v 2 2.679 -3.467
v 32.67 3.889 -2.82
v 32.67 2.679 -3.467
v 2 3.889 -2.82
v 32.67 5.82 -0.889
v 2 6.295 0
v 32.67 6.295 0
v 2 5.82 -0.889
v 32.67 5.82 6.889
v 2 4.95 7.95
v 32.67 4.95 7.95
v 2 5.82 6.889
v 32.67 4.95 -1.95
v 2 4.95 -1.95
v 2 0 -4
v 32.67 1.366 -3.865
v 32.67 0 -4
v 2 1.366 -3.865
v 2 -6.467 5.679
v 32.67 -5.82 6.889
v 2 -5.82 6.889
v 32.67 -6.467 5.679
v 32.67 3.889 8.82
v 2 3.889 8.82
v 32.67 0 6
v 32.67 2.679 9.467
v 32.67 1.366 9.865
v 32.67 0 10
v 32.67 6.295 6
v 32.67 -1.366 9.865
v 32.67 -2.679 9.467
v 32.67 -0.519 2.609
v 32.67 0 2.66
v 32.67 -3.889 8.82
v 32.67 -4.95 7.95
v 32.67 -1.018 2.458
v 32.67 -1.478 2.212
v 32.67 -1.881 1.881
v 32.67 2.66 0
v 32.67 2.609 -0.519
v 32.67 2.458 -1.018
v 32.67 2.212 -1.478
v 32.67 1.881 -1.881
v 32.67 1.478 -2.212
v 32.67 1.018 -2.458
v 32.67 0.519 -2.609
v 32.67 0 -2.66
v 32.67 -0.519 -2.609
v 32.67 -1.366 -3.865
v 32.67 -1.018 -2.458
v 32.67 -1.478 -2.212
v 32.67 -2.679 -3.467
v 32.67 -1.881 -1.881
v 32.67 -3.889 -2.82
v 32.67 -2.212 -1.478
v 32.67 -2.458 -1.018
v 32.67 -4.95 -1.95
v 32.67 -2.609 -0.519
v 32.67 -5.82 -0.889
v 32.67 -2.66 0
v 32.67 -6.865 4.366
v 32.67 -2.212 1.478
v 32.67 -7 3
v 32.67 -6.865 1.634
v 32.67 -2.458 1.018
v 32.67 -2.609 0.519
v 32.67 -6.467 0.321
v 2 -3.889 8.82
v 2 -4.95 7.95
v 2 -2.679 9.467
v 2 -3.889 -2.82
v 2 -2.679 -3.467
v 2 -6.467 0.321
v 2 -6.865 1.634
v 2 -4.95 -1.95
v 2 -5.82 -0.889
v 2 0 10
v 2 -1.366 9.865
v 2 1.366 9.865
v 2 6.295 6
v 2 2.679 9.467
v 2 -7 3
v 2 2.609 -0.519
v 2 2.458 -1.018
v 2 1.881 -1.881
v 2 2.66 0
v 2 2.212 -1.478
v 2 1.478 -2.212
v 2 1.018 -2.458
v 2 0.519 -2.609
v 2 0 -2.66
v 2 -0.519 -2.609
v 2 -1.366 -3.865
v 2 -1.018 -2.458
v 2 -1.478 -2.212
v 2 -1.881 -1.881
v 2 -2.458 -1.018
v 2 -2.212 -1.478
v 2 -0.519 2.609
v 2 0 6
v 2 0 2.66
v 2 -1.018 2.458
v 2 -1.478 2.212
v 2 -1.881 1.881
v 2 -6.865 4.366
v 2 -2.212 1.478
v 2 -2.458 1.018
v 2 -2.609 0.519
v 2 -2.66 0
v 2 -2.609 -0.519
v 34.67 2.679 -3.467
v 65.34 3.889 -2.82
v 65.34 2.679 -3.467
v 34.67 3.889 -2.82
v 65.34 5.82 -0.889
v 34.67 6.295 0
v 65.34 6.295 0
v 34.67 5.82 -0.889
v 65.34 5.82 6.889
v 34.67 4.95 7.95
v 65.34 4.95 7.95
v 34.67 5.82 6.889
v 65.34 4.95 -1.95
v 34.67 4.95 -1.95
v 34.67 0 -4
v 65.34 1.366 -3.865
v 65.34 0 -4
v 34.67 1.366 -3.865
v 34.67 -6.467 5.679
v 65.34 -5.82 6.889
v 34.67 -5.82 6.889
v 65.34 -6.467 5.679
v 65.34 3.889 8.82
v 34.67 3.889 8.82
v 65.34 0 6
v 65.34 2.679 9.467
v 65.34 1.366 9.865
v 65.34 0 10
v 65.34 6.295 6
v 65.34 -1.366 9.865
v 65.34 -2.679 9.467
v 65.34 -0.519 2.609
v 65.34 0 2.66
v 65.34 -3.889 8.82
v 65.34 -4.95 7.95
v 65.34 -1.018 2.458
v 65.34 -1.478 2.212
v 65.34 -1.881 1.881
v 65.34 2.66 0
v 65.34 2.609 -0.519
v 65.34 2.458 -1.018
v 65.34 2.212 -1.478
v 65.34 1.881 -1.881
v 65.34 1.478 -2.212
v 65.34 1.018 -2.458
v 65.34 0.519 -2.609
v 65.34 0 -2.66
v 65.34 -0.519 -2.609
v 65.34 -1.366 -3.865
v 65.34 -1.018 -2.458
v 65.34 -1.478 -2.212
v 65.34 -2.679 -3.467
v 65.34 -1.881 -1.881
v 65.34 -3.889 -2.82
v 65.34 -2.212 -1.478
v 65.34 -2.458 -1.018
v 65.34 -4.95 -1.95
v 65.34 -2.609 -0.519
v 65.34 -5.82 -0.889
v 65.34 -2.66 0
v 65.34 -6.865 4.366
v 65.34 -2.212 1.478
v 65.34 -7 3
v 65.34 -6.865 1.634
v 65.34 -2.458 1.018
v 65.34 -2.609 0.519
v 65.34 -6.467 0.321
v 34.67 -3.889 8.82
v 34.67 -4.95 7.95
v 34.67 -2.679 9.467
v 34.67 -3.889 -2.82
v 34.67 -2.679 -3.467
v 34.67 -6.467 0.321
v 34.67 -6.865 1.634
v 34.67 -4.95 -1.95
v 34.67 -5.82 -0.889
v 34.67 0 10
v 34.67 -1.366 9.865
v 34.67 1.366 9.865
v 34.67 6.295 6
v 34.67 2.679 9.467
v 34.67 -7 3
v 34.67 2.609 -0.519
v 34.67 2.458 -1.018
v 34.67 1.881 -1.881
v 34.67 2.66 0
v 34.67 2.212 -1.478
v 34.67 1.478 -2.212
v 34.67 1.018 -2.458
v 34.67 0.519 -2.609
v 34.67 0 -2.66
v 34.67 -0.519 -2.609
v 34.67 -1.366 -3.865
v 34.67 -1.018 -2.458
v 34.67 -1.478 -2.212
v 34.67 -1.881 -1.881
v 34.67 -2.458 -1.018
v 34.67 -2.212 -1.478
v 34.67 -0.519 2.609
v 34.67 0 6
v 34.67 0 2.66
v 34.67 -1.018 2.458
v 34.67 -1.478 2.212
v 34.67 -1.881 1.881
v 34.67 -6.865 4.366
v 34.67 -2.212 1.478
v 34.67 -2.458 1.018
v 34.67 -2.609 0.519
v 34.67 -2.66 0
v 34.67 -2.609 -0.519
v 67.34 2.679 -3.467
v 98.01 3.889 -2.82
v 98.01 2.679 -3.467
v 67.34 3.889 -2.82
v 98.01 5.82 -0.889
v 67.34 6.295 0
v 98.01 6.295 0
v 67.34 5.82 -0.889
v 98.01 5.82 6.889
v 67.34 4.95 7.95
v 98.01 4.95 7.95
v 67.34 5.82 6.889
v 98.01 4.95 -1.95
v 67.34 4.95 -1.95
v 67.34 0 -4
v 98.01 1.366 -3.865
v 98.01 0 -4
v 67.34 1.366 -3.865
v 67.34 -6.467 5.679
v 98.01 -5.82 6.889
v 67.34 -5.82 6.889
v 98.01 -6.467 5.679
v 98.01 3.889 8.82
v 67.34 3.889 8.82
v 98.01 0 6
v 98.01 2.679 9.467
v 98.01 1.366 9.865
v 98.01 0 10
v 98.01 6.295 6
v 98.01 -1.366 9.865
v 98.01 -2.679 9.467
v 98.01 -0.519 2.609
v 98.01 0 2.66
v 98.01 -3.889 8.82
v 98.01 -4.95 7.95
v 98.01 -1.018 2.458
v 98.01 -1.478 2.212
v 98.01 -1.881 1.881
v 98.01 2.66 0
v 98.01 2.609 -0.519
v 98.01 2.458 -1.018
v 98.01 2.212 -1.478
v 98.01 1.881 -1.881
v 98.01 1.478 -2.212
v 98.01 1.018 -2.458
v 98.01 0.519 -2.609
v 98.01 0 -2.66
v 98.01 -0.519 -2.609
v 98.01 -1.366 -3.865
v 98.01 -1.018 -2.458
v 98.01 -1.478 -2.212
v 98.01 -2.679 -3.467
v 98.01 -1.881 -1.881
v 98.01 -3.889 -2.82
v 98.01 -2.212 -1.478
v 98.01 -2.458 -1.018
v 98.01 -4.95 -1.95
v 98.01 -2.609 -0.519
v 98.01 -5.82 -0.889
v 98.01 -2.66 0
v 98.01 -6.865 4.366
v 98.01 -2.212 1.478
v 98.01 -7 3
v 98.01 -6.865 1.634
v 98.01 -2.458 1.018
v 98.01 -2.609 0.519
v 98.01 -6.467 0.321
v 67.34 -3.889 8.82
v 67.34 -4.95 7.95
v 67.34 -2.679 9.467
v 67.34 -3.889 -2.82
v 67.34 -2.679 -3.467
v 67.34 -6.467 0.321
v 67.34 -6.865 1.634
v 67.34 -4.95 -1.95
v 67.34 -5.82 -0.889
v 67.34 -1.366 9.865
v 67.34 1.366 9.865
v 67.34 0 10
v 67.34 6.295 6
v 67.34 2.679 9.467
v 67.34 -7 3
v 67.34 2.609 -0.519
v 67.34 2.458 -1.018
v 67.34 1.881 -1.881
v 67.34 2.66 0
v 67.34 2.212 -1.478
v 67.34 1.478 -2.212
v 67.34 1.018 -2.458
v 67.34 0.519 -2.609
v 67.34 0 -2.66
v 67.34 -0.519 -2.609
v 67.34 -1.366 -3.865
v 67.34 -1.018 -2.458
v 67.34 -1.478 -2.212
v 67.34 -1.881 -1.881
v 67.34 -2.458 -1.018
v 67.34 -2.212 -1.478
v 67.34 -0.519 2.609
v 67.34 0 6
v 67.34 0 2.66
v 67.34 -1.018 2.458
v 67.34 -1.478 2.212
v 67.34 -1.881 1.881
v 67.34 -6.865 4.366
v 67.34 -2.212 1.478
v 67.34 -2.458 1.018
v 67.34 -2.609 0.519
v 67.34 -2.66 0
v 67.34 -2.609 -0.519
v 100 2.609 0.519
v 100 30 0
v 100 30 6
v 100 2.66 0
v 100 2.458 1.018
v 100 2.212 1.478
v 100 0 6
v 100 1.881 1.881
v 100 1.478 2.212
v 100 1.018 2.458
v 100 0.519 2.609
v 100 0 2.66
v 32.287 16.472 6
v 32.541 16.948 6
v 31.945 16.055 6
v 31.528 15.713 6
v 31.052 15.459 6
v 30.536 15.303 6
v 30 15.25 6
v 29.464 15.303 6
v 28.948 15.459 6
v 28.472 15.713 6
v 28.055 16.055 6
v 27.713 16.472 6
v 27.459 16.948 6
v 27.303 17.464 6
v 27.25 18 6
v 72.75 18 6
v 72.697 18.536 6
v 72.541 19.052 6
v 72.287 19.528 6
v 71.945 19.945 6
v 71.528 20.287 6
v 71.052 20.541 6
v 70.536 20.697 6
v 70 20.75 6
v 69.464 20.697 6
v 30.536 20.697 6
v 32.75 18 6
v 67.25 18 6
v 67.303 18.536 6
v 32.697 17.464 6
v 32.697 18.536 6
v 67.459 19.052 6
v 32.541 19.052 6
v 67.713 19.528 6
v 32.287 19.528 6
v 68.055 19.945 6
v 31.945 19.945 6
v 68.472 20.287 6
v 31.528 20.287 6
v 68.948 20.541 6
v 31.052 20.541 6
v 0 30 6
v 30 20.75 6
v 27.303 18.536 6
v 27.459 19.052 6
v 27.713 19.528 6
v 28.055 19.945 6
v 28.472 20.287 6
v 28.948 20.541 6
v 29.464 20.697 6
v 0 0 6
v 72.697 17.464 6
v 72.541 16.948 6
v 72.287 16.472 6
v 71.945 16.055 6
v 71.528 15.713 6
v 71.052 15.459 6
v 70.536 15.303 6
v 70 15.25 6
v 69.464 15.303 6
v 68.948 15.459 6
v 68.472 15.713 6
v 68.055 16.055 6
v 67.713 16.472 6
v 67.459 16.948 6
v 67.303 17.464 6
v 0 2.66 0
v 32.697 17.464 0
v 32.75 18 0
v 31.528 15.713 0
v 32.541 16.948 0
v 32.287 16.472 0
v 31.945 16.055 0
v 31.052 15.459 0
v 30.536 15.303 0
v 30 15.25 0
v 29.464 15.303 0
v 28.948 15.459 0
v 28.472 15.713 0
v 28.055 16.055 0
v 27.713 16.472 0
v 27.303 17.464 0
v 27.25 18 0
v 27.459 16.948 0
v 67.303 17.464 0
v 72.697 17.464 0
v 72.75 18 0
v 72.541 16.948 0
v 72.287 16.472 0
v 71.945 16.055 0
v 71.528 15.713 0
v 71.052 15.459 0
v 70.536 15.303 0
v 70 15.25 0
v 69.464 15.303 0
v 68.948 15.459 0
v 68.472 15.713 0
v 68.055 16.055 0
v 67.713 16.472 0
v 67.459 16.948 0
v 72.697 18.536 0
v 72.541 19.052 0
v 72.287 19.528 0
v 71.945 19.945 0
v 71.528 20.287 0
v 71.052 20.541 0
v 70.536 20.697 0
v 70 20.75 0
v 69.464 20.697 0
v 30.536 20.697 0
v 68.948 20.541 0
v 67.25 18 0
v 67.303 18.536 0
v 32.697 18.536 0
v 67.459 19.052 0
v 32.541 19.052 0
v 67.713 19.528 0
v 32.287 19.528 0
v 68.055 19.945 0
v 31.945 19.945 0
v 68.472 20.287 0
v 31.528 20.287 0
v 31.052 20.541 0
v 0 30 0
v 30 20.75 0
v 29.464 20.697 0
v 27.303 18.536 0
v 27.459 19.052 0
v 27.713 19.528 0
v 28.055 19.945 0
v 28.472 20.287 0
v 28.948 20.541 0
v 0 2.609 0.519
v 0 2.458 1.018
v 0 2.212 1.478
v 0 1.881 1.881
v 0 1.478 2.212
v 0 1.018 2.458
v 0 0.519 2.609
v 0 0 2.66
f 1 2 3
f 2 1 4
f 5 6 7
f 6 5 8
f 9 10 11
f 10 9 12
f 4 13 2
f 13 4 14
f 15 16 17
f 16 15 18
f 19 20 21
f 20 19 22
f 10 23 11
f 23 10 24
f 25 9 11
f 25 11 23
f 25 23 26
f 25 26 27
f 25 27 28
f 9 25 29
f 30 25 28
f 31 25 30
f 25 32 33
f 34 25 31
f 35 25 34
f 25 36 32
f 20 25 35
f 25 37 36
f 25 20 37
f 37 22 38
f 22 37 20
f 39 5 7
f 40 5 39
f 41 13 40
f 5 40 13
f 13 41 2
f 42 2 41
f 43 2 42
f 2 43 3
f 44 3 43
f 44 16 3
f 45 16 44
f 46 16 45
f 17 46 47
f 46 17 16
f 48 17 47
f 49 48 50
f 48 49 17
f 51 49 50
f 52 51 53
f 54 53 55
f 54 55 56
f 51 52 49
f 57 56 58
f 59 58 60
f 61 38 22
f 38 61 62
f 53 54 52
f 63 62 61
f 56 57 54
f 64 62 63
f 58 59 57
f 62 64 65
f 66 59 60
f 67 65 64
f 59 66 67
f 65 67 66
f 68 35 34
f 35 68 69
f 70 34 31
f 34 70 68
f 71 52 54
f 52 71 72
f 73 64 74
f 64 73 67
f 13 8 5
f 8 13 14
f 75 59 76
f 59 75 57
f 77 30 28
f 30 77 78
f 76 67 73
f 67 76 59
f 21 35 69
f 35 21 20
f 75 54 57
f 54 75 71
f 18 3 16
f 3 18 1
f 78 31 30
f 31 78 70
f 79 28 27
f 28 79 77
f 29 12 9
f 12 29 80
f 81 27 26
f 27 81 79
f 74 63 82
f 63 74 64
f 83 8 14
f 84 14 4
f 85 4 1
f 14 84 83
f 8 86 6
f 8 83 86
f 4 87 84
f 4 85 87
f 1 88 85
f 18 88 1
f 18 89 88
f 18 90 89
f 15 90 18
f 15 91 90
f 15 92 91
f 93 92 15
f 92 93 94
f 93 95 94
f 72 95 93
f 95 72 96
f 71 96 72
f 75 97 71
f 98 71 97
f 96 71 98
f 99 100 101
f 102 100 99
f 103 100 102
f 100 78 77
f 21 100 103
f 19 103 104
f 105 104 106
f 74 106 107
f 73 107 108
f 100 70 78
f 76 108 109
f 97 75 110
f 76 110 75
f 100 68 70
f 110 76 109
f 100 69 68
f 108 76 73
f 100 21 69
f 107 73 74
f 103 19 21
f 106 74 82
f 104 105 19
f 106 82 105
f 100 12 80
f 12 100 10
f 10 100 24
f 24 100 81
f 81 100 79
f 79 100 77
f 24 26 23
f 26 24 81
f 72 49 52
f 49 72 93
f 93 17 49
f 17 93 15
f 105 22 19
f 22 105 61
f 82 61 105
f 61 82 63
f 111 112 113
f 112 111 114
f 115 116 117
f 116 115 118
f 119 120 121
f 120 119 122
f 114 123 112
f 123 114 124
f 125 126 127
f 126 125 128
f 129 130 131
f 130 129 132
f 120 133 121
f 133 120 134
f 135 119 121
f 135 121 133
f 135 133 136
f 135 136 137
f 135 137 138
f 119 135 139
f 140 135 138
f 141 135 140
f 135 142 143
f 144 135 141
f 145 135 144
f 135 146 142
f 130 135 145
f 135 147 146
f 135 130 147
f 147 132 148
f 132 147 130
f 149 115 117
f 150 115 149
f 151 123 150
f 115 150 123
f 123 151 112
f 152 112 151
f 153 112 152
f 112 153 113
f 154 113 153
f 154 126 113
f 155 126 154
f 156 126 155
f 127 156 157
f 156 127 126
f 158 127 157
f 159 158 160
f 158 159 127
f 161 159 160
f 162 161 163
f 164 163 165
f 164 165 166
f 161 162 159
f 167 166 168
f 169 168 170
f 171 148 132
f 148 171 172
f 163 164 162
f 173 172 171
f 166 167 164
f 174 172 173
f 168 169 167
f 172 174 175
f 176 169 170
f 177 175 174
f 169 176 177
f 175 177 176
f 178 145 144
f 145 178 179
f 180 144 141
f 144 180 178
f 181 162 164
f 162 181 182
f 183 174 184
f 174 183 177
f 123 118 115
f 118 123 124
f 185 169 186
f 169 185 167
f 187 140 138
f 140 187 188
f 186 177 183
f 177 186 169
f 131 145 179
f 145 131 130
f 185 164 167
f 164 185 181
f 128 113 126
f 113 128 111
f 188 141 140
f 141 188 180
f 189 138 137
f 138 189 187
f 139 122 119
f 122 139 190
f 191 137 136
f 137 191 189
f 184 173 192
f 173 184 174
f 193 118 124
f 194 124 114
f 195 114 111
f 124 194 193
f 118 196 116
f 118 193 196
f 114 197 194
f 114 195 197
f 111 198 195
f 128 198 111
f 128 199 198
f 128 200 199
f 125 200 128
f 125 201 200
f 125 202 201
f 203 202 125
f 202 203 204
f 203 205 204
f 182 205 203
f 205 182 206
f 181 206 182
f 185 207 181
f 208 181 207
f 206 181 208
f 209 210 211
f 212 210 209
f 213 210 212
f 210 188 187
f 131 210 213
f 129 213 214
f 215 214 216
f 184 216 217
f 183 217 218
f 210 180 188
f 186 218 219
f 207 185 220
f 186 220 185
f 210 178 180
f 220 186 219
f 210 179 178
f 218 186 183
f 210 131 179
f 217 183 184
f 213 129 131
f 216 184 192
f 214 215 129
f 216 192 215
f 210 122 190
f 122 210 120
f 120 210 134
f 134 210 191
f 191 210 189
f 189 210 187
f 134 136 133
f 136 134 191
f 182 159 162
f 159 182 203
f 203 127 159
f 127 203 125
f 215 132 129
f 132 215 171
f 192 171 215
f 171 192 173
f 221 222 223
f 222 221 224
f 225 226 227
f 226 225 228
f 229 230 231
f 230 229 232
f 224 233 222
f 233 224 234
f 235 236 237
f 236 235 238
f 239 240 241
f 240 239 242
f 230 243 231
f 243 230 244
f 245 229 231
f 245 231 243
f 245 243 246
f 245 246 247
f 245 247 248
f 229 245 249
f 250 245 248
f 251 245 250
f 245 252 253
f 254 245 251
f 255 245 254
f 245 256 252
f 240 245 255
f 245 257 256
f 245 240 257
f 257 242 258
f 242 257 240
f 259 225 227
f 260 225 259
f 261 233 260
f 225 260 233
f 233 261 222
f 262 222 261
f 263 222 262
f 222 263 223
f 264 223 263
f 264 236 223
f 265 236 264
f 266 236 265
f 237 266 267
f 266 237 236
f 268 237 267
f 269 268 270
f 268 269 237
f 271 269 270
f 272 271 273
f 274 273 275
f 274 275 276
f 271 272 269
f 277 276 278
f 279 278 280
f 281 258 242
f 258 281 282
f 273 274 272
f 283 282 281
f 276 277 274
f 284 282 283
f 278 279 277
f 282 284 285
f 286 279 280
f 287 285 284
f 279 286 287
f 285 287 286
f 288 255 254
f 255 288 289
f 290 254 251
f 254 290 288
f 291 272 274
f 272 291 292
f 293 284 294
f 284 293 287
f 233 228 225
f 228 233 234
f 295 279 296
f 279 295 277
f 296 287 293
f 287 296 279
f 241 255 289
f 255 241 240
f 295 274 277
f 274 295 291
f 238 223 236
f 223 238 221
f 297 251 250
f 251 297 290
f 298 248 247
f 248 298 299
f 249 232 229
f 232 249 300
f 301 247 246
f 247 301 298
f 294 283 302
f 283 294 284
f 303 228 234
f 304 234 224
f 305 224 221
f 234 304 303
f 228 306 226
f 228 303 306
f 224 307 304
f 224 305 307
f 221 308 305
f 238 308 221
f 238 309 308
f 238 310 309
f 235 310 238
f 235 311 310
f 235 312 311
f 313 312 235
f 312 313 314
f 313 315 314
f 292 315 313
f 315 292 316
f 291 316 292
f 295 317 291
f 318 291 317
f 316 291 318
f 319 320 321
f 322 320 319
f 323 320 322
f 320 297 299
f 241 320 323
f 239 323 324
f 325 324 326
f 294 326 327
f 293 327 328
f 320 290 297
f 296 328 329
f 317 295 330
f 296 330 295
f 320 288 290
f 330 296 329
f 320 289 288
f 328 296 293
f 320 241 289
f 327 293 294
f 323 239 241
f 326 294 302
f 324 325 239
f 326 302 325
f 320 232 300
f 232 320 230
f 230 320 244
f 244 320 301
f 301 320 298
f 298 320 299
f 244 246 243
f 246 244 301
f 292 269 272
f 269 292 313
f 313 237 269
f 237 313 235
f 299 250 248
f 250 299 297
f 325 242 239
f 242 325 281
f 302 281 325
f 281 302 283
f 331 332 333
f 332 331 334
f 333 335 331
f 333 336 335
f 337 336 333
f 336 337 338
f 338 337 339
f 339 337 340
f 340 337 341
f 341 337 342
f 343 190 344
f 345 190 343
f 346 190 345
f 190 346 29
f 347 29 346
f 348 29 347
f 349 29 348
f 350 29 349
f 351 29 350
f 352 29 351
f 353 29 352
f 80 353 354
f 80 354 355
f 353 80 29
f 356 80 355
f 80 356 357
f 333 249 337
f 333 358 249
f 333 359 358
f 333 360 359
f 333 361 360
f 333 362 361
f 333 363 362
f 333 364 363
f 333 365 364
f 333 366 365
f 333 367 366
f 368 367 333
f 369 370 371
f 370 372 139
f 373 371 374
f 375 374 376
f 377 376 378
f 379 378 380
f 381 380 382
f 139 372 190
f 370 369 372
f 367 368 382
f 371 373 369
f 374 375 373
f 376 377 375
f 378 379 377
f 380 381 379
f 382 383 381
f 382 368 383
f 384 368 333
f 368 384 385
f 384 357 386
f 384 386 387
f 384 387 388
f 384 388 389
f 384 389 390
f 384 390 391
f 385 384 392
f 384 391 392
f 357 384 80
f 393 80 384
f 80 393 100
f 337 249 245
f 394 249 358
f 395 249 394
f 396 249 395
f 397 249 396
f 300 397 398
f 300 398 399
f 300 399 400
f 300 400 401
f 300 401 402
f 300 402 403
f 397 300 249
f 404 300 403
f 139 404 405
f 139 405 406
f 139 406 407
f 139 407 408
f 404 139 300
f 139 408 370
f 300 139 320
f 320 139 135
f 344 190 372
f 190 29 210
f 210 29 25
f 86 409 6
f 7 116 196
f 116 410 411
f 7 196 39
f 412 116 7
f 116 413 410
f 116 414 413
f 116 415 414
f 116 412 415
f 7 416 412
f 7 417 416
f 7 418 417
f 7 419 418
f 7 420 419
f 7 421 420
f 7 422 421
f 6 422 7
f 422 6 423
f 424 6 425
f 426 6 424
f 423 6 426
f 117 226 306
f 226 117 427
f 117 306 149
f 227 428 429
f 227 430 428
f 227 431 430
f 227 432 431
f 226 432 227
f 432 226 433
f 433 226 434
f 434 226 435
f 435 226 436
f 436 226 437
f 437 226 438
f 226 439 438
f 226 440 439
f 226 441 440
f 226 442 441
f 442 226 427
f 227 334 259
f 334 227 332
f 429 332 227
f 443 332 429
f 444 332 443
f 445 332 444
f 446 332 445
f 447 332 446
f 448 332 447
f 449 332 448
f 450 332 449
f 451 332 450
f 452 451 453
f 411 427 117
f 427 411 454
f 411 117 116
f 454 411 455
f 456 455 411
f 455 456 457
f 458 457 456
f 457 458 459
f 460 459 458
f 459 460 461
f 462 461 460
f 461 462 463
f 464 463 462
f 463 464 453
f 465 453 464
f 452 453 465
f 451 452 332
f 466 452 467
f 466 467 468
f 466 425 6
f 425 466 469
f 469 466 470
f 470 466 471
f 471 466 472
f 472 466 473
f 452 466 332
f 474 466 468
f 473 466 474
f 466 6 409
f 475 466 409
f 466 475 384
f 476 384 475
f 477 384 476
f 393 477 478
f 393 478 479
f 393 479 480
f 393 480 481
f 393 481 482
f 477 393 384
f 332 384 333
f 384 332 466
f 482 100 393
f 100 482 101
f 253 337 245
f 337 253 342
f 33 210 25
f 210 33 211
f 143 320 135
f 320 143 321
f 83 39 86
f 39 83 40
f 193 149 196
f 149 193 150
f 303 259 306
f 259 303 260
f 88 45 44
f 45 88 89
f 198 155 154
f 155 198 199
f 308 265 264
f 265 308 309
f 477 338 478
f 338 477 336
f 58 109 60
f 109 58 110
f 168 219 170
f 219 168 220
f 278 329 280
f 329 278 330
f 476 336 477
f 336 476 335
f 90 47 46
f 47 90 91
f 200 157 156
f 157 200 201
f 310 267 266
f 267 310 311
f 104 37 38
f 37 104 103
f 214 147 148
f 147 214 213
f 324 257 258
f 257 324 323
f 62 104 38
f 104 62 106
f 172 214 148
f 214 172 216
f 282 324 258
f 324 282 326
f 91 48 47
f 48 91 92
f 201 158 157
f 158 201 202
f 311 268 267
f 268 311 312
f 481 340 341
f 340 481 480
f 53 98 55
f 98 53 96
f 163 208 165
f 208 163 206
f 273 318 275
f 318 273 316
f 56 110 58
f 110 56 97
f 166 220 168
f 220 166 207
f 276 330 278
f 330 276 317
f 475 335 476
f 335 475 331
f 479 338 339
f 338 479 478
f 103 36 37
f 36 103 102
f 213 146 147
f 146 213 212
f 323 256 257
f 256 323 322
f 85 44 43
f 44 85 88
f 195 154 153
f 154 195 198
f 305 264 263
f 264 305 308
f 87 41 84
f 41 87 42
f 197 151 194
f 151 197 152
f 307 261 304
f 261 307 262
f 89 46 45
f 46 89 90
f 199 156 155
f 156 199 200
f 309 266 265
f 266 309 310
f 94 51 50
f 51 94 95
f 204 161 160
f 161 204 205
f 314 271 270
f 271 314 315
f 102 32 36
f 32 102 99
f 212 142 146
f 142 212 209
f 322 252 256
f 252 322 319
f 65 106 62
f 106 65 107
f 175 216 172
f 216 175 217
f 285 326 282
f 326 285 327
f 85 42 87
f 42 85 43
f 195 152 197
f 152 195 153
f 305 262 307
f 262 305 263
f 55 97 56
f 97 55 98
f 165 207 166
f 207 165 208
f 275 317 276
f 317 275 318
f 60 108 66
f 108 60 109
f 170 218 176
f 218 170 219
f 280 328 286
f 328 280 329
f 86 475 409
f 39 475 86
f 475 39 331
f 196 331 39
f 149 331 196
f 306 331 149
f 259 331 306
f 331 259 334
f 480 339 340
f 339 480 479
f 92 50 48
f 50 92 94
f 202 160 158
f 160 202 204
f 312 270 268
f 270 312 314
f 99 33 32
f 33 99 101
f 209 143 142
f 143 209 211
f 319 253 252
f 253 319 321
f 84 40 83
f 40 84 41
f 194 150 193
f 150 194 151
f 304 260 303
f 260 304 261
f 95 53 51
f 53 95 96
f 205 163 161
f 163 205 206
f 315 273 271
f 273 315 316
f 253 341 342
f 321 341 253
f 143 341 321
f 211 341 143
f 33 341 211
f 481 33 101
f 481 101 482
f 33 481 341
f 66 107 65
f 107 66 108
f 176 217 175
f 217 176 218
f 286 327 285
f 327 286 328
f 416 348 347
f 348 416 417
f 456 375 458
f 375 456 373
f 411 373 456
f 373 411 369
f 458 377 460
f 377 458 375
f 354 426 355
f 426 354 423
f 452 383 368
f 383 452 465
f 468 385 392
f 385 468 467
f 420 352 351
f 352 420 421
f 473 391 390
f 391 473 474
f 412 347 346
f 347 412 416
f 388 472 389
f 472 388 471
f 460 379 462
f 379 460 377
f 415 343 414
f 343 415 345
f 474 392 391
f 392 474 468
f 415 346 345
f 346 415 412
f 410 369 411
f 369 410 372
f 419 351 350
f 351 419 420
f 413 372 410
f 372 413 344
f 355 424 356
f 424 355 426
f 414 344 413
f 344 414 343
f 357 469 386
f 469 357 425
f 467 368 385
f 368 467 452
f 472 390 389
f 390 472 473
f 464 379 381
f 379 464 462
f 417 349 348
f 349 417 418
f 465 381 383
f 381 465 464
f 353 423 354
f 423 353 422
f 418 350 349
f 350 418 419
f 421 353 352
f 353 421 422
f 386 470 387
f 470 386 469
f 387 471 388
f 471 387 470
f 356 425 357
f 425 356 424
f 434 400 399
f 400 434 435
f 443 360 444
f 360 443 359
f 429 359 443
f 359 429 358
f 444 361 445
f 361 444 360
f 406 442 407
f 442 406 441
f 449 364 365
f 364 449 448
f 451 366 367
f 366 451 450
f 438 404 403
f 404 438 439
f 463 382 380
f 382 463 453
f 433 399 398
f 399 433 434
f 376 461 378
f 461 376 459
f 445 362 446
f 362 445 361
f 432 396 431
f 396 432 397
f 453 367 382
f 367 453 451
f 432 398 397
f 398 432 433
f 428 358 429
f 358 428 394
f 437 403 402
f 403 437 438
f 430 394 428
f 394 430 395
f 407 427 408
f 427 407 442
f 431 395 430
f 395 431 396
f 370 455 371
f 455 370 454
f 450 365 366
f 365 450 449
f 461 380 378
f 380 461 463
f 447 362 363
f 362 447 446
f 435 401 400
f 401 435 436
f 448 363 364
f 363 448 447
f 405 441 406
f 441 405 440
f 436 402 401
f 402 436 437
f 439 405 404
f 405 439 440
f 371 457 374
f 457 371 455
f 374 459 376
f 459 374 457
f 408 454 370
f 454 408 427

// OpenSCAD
$fn = 32;

// ----------------------------------------------------------------------
// Hinge leaf: 100 x 37 x 14 mm
// ----------------------------------------------------------------------

// --- parameters (mm) ---
tab_len = 100;            // leaf length, X
tab_w = 30;               // leaf width, Y
tab_t = 6;                // leaf thickness
ring_d = 14;              // knuckle diameter
ring_w = 30.67;           // knuckle width
knuckle_n = 3;            // number of knuckles
pin_d = 5.32;             // pin bore
gap = 2;                  // gap between the knuckles
screw_d = 5.5;            // screw clearance

module leaf() {
  cube([tab_len, tab_w, tab_t]);
}

module knuckles() {
  /* barrels sit on the leaf edge, the pin axis at half the leaf thickness */
  for (i = [0 : knuckle_n - 1])
    translate([gap + i * (ring_w + gap), 0, tab_t * 0.5])
      rotate([0, 90, 0]) cylinder(h = ring_w, d = ring_d);
}

difference() {
  union() {
    leaf();
    knuckles();
  }
  rotate([0, 90, 0]) translate([0, 0, -1])
    cylinder(h = tab_len + 2, d = pin_d);
  translate([30, tab_w * 0.6, -1]) cylinder(h = tab_t + 2, d = screw_d);
  translate([70, tab_w * 0.6, -1]) cylinder(h = tab_t + 2, d = screw_d);
}
